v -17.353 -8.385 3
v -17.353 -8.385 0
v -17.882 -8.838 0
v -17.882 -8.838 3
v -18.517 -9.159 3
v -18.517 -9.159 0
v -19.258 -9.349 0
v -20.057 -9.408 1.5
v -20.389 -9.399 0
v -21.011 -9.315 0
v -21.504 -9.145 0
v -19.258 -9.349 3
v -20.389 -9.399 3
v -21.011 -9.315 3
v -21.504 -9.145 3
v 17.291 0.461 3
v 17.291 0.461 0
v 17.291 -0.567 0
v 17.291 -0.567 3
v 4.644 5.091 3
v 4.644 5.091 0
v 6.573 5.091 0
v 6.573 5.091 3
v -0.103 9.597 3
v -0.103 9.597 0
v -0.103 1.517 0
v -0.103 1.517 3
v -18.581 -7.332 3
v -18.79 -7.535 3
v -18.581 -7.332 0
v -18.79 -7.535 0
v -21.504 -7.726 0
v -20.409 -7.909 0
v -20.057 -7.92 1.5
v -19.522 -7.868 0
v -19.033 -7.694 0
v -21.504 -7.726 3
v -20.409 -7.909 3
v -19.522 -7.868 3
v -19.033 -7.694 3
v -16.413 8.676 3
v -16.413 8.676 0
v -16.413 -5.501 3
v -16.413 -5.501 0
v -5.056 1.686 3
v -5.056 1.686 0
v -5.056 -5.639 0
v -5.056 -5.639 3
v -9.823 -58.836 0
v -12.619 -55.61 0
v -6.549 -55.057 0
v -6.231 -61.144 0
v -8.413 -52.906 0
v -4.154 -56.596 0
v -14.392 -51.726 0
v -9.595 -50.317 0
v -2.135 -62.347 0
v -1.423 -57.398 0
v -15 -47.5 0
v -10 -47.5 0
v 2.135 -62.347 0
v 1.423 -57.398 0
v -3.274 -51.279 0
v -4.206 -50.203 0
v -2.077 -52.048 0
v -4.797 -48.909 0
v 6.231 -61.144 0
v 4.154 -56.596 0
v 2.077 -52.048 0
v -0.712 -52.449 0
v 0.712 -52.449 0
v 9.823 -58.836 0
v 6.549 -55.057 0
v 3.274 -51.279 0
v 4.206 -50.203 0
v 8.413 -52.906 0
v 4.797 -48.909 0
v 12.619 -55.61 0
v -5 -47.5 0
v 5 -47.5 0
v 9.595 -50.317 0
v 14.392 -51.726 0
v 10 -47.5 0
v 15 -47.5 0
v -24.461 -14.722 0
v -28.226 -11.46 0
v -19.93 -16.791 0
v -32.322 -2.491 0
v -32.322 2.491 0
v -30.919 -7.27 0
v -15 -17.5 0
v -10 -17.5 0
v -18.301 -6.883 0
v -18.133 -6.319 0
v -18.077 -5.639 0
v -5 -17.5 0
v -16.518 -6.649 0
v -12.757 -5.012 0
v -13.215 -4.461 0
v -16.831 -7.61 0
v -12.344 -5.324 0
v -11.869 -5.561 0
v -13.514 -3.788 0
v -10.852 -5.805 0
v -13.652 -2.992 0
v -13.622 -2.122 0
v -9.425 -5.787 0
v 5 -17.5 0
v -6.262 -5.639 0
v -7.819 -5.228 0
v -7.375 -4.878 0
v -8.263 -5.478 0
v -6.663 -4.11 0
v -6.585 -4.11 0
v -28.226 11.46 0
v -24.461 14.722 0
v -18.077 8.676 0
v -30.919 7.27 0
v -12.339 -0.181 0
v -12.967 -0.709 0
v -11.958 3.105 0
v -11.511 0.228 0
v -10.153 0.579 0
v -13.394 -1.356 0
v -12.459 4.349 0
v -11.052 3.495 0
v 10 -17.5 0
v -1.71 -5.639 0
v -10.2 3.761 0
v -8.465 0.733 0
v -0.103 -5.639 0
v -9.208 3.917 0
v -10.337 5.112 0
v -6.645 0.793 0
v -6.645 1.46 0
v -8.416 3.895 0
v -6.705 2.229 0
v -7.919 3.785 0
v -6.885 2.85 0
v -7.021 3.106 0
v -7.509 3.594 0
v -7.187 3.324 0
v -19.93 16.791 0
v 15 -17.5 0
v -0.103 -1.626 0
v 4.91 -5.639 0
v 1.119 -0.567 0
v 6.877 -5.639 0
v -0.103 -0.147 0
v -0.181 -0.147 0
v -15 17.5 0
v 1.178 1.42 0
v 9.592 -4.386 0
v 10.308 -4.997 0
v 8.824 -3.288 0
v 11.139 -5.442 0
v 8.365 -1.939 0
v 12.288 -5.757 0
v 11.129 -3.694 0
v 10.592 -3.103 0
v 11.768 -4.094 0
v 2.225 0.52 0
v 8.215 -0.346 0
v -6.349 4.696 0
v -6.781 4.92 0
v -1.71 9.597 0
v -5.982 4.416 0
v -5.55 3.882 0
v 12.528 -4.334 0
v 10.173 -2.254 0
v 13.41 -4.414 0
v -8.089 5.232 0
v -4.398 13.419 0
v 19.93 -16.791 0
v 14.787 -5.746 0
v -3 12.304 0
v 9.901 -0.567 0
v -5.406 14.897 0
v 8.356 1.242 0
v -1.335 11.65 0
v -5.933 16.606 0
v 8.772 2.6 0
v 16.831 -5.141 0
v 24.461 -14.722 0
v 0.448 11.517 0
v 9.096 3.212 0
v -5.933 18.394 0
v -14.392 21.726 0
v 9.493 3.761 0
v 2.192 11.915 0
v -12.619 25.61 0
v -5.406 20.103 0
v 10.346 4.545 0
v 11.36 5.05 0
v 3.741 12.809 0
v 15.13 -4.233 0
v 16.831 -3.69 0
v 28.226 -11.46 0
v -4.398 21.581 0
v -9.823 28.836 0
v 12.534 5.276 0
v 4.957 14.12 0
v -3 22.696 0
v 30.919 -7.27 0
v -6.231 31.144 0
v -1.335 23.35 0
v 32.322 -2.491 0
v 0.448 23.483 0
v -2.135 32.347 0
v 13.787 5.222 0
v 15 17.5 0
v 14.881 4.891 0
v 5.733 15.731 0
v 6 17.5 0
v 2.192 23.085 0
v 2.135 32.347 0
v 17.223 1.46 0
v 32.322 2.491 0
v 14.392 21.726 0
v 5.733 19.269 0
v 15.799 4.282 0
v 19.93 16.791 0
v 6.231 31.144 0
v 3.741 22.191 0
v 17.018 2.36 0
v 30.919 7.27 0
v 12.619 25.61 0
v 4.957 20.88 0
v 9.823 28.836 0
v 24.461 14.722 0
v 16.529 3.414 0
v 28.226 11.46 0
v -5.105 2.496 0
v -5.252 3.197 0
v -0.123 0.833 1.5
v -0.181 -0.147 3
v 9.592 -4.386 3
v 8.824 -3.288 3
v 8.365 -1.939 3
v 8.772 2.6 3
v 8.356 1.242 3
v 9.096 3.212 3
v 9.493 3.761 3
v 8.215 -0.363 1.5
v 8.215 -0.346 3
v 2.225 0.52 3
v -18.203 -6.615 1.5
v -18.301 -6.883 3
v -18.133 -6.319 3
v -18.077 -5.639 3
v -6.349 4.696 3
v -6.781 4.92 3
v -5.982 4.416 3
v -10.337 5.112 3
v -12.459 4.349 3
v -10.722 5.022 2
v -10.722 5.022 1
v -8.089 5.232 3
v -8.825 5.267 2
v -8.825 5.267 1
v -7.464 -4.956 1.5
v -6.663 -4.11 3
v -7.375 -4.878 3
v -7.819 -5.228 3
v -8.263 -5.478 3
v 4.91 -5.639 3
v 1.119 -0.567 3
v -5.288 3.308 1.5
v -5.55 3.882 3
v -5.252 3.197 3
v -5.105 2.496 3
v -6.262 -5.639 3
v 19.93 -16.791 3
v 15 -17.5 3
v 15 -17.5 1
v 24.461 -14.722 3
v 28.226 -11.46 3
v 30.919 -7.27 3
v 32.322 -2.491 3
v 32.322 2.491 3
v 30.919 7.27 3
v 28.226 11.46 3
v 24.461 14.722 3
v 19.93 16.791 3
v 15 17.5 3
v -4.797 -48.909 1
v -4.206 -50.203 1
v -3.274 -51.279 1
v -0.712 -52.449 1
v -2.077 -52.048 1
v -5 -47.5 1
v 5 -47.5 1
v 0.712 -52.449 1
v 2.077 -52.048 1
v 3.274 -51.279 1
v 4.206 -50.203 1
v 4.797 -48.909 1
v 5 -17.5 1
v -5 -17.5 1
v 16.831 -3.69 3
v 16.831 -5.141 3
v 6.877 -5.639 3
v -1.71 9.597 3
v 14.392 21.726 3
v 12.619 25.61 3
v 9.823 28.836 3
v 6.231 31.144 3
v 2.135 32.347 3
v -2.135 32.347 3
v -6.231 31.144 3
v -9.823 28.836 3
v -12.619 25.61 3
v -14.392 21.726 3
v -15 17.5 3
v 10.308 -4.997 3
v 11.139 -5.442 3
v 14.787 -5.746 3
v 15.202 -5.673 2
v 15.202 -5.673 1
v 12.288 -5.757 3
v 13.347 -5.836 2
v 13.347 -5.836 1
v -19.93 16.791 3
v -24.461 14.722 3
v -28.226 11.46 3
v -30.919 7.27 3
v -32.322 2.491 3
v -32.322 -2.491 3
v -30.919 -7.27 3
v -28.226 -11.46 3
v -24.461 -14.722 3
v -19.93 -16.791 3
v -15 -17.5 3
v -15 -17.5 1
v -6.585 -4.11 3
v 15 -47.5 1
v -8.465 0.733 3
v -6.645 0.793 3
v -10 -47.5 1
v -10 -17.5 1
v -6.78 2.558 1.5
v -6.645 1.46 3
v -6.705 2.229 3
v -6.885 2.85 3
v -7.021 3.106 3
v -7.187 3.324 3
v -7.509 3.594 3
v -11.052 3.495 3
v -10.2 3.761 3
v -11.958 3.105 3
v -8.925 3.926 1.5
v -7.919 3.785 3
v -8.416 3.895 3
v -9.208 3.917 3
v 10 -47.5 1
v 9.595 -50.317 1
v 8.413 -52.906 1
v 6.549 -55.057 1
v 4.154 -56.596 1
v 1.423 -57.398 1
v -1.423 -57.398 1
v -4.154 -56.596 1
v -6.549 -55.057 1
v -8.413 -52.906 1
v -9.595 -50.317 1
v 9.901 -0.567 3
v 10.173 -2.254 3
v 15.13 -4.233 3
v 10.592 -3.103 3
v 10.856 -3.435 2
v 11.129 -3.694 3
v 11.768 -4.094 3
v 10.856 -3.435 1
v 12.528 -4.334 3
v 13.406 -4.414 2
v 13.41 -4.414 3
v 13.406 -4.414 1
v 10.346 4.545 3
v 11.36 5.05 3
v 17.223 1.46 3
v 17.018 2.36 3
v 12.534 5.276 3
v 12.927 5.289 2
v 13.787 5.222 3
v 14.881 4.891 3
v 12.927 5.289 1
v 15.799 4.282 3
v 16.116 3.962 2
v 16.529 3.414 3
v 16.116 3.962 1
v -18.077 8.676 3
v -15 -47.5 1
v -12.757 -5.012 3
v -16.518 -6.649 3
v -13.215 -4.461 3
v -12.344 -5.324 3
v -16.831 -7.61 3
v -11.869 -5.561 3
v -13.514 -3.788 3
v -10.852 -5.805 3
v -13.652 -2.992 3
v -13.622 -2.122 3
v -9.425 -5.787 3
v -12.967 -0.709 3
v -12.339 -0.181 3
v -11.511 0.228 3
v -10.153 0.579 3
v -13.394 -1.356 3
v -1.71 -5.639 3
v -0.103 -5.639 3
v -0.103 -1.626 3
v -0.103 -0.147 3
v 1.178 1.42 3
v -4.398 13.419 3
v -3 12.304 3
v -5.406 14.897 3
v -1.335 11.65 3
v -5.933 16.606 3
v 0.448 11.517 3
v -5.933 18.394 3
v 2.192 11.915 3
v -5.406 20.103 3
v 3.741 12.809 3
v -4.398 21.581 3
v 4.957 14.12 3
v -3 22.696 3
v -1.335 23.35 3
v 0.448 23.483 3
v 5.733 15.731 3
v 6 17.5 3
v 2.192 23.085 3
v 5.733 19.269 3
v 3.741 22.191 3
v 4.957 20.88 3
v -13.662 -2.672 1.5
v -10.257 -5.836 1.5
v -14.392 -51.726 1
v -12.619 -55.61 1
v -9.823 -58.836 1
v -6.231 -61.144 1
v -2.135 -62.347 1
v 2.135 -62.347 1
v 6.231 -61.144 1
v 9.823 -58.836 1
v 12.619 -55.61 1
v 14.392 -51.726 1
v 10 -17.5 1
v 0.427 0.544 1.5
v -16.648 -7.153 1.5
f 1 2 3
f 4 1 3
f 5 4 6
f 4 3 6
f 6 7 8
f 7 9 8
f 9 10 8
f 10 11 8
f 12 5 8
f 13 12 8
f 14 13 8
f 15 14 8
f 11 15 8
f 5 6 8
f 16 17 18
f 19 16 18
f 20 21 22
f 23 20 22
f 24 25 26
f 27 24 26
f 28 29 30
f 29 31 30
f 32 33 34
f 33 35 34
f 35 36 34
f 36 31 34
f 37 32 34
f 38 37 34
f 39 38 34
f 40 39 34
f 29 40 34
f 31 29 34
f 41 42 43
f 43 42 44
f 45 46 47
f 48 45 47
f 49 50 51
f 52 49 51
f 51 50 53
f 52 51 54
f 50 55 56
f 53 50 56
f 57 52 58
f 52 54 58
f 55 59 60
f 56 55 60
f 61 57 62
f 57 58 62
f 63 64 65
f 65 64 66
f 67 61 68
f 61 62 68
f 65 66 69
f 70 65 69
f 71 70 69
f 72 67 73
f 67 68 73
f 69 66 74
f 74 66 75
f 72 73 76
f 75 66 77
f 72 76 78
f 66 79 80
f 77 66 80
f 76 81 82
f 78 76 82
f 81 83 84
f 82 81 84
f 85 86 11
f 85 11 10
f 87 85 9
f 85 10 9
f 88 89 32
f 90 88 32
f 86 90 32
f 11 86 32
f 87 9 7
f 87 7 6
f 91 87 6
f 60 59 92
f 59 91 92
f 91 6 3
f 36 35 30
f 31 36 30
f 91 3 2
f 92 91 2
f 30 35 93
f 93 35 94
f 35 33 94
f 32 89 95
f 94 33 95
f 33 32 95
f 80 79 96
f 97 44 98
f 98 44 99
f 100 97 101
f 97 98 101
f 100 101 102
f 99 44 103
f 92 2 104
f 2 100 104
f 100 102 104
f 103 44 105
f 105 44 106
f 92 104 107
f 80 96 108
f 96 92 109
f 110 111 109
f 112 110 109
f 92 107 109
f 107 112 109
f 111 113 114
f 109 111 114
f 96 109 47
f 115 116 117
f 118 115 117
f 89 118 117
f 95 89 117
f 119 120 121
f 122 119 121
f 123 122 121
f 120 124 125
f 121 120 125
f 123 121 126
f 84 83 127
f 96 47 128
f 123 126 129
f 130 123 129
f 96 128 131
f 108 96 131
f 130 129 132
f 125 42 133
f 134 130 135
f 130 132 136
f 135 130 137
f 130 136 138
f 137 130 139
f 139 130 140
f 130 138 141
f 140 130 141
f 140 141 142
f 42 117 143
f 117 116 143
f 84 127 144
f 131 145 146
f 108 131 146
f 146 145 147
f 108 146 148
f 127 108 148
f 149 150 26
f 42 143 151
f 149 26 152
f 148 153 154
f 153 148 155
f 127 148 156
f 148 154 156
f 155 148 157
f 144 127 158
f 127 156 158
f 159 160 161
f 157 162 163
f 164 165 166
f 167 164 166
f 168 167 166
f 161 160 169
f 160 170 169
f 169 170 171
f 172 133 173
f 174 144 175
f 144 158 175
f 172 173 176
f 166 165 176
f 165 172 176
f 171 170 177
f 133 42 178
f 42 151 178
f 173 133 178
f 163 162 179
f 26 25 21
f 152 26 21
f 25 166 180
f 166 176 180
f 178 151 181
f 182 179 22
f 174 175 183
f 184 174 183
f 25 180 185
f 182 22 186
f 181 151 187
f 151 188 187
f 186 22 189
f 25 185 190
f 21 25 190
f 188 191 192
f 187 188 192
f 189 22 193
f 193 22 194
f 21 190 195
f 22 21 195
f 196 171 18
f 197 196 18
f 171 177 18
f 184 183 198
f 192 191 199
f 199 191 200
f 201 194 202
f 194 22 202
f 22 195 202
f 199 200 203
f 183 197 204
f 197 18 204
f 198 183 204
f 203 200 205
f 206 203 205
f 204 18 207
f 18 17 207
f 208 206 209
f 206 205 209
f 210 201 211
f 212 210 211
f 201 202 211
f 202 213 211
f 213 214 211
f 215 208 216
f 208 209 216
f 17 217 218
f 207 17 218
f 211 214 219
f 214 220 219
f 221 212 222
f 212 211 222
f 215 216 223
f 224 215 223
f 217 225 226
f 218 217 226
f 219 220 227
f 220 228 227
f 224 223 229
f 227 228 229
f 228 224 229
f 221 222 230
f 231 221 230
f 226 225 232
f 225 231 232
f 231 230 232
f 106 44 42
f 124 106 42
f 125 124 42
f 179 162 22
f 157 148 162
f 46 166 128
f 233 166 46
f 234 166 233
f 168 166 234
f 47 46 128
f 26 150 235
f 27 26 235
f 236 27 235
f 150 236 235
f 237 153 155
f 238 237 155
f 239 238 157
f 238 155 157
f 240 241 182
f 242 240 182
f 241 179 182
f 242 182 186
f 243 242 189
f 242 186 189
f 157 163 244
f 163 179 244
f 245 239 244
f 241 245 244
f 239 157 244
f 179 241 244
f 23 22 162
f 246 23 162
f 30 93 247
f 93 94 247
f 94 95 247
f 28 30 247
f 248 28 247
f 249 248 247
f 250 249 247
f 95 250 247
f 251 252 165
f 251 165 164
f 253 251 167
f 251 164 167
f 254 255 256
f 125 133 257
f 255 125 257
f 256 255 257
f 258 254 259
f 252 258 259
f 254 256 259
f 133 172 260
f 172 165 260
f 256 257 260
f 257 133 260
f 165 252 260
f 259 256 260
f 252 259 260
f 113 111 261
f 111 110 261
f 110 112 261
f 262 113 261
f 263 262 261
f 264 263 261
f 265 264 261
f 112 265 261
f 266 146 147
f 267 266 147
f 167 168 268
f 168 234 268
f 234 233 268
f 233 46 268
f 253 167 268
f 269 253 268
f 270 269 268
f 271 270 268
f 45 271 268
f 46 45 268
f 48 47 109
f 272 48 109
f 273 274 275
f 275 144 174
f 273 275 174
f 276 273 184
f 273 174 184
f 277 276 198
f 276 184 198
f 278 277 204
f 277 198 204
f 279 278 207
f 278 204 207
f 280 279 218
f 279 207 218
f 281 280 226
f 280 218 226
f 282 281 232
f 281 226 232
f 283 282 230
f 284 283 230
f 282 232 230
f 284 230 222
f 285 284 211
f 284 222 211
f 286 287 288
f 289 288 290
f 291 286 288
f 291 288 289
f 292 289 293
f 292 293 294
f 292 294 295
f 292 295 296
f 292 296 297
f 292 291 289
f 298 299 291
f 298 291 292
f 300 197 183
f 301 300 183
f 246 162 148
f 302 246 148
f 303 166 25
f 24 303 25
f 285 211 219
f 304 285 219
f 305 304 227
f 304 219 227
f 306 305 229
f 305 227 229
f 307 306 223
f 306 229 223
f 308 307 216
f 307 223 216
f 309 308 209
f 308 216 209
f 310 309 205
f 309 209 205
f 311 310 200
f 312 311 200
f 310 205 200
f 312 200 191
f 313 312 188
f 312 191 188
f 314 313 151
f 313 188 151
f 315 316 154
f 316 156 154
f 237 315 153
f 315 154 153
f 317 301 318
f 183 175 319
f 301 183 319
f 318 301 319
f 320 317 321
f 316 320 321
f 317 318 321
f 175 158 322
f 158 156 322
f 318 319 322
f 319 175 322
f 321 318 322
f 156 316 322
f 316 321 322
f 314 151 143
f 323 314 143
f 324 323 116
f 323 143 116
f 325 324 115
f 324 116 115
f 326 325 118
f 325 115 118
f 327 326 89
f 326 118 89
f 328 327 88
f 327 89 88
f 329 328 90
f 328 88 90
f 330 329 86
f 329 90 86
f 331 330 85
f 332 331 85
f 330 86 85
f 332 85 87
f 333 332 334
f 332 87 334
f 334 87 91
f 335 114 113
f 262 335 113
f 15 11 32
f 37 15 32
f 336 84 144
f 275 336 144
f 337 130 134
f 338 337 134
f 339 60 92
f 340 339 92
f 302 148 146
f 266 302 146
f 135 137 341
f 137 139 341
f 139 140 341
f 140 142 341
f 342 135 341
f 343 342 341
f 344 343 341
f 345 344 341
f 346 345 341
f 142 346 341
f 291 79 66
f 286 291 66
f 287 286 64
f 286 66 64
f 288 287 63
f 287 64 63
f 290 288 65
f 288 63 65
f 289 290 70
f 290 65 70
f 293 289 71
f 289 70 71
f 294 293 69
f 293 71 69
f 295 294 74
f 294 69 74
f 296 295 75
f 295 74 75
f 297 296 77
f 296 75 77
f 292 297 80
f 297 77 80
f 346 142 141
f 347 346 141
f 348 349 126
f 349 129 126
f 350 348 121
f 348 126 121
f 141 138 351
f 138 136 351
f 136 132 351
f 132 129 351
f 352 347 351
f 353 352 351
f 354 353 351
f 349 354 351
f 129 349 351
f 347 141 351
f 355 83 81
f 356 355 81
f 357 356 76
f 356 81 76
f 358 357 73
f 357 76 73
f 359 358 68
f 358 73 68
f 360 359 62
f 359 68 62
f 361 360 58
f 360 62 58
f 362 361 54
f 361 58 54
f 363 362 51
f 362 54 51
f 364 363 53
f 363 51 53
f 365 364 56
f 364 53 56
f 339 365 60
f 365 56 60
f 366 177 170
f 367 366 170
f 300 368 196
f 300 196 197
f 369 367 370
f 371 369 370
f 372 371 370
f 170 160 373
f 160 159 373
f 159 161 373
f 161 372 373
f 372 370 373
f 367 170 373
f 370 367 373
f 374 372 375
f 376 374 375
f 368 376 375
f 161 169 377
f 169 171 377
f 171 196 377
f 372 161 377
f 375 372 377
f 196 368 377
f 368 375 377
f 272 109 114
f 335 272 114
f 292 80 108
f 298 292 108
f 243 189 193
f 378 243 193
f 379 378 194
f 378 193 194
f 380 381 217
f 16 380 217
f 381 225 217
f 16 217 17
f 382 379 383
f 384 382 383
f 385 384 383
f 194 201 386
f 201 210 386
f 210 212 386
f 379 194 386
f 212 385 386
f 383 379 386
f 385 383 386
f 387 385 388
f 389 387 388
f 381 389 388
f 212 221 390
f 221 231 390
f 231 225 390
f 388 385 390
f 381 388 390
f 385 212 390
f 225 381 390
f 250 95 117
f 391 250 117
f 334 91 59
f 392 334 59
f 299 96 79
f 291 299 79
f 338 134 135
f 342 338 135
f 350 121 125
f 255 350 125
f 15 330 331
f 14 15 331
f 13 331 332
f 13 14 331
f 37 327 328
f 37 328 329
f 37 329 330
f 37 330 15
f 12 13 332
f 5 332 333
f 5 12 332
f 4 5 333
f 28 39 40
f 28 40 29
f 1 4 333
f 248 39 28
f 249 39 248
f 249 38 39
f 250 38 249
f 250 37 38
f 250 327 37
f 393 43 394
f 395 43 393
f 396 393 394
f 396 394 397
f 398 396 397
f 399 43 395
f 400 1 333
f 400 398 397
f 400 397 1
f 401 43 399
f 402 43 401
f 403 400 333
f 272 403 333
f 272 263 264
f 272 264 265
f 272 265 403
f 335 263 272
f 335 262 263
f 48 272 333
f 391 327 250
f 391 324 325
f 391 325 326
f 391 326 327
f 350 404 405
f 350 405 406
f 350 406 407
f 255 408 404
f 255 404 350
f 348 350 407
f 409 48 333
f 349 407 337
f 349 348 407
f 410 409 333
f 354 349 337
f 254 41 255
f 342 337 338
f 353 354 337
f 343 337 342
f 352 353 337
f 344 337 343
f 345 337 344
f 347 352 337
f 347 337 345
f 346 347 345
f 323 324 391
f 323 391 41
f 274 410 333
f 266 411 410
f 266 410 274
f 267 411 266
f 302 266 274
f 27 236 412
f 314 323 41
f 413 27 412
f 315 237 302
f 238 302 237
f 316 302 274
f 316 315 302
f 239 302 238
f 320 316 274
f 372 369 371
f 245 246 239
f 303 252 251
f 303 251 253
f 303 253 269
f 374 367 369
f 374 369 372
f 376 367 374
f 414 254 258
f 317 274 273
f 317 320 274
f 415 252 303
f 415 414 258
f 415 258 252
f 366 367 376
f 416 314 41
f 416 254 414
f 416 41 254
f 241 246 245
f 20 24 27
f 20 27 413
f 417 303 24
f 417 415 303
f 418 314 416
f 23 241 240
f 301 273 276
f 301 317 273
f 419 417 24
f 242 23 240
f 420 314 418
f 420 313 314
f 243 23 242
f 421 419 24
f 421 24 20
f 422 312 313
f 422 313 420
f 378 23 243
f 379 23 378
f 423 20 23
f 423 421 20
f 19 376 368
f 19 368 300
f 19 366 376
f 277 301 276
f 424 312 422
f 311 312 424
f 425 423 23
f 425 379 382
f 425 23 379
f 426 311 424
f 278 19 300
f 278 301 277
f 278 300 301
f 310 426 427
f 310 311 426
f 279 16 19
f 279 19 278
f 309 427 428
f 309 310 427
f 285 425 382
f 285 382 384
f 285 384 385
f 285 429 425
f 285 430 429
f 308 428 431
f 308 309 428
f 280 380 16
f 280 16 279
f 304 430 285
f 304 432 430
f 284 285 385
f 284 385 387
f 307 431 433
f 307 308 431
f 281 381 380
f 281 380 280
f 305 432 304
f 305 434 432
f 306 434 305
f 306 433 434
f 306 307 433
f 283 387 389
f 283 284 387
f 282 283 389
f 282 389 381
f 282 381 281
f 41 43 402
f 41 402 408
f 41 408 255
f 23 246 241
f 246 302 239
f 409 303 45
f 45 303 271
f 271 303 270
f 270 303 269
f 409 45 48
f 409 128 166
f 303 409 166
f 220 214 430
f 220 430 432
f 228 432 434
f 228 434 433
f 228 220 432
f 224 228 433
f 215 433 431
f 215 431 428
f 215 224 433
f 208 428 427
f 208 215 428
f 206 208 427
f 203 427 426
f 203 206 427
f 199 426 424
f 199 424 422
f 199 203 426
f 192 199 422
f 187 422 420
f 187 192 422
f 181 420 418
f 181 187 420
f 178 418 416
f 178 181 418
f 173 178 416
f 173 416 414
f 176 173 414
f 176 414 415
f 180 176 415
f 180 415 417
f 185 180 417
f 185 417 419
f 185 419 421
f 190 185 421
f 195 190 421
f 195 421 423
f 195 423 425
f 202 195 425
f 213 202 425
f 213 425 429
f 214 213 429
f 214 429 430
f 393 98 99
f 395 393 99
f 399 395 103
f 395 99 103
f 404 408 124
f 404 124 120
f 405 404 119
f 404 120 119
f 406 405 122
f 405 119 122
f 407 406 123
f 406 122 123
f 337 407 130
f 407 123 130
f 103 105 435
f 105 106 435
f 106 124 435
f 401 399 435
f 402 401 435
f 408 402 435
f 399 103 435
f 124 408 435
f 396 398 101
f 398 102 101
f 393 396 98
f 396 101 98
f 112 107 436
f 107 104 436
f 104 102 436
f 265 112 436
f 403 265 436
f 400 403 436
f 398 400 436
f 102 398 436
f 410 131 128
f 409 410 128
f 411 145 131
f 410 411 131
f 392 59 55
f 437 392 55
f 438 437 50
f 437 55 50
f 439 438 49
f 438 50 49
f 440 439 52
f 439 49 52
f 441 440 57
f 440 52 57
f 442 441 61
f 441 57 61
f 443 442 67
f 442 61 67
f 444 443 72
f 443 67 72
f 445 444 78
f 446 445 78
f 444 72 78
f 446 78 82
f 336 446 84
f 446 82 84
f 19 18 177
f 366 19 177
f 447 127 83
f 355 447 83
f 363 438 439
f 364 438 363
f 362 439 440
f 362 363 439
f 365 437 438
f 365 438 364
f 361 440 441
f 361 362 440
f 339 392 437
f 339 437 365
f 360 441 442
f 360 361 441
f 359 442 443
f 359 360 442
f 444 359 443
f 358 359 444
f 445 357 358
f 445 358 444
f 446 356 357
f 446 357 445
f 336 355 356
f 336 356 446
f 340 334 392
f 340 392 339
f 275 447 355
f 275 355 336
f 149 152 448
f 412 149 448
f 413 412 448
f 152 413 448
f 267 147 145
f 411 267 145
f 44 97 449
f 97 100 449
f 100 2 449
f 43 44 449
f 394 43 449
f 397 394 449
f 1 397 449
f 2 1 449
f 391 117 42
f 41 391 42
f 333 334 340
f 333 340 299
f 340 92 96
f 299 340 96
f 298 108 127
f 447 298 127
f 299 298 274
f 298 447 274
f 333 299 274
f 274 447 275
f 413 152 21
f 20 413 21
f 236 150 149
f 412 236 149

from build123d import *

# Parameters (mm, degrees)
F0_R     = 6
F1_DEPTH = 3
F2_DEPTH = 1


with BuildPart() as f1:
    # F0 (on Top) → F1 (new body)
    with BuildSketch(Plane.XY):
        with BuildLine():
            Line((10, -17.5), (15, -17.5))
            ThreePointArc((15, -17.5), (32.5, 0), (15, 17.5))
            ThreePointArc((15, 17.5), (0, 32.5), (-15, 17.5))
            ThreePointArc((-15, 17.5), (-32.5, 0), (-15, -17.5))
            Line((-15, -17.5), (-10, -17.5))
            Line((-10, -17.5), (-5, -17.5))
            Line((-5, -17.5), (5, -17.5))
            Line((5, -17.5), (10, -17.5))
        make_face()
        with BuildLine():
            add(Edge.make_bspline(
                [(-17.3530564989, -8.385057961), (-18.2929470593, -9.4079721875), (-20.0568083443, -9.4079721875)],
                knots=[0, 0, 0, 1, 1, 1], degree=2))
            add(Edge.make_bspline(
                [(-20.0568083443, -9.4079721875), (-20.974768125, -9.4079721875), (-21.5042398074, -9.1448028306)],
                knots=[0, 0, 0, 1, 1, 1], degree=2))
            Line((-21.5042398074, -9.1448028306), (-21.5042398074, -7.7255680844))
            add(Edge.make_bspline(
                [(-21.5042398074, -7.7255680844), (-20.8087207927, -7.9198121336), (-20.0568083443, -7.9198121336)],
                knots=[0, 0, 0, 1, 1, 1], degree=2))
            add(Edge.make_bspline(
                [(-20.0568083443, -7.9198121336), (-19.0855880986, -7.9198121336), (-18.5811801645, -7.3323805333)],
                knots=[0, 0, 0, 1, 1, 1], degree=2))
            add(Edge.make_bspline(
                [(-18.5811801645, -7.3323805333), (-18.0767722304, -6.7449489331), (-18.0767722304, -5.6390110403)],
                knots=[0, 0, 0, 1, 1, 1], degree=2))
            Line((-18.0767722304, -5.6390110403), (-18.0767722304, 8.6755221946))
            Line((-18.0767722304, 8.6755221946), (-16.4131659385, 8.6755221946))
            Line((-16.4131659385, 8.6755221946), (-16.4131659385, -5.5011604248))
            add(Edge.make_bspline(
                [(-16.4131659385, -5.5011604248), (-16.4131659385, -7.3621437344), (-17.3530564989, -8.385057961)],
                knots=[0, 0, 0, 1, 1, 1], degree=2))
        make_face(mode=Mode.SUBTRACT)
        with BuildLine():
            Line((-5.0561550003, -5.6390110403), (-6.2623478861, -5.6390110403))
            Line((-6.2623478861, -5.6390110403), (-6.5850436452, -4.1101223954))
            Line((-6.5850436452, -4.1101223954), (-6.6633678586, -4.1101223954))
            add(Edge.make_bspline(
                [(-6.6633678586, -4.1101223954), (-7.4654078035, -5.1189382636), (-8.2627482955, -5.4776631608)],
                knots=[0, 0, 0, 1, 1, 1], degree=2))
            add(Edge.make_bspline(
                [(-8.2627482955, -5.4776631608), (-9.0600887876, -5.836388058), (-10.2568827679, -5.836388058)],
                knots=[0, 0, 0, 1, 1, 1], degree=2))
            add(Edge.make_bspline(
                [(-10.2568827679, -5.836388058), (-11.851563752, -5.836388058), (-12.7569916585, -5.0124173334)],
                knots=[0, 0, 0, 1, 1, 1], degree=2))
            add(Edge.make_bspline(
                [(-12.7569916585, -5.0124173334), (-13.6624195651, -4.1884466088), (-13.6624195651, -2.672089838)],
                knots=[0, 0, 0, 1, 1, 1], degree=2))
            add(Edge.make_bspline(
                [(-13.6624195651, -2.672089838), (-13.6624195651, 0.5767985325), (-8.464824766, 0.7334469592)],
                knots=[0, 0, 0, 1, 1, 1], degree=2))
            Line((-8.464824766, 0.7334469592), (-6.6445700474, 0.7929733614))
            Line((-6.6445700474, 0.7929733614), (-6.6445700474, 1.4602956592))
            add(Edge.make_bspline(
                [(-6.6445700474, 1.4602956592), (-6.6445700474, 2.7228819787), (-7.1865736039, 3.3244119374)],
                knots=[0, 0, 0, 1, 1, 1], degree=2))
            add(Edge.make_bspline(
                [(-7.1865736039, 3.3244119374), (-7.7285771604, 3.925941896), (-8.9253711406, 3.925941896)],
                knots=[0, 0, 0, 1, 1, 1], degree=2))
            add(Edge.make_bspline(
                [(-8.9253711406, 3.925941896), (-10.2662816735, 3.925941896), (-11.9580846822, 3.10510414)],
                knots=[0, 0, 0, 1, 1, 1], degree=2))
            Line((-11.9580846822, 3.10510414), (-12.4593596477, 4.3488926482))
            add(Edge.make_bspline(
                [(-12.4593596477, 4.3488926482), (-11.6667186085, 4.7781093375), (-10.7221285953, 5.0224808832)],
                knots=[0, 0, 0, 1, 1, 1], degree=2))
            add(Edge.make_bspline(
                [(-10.7221285953, 5.0224808832), (-9.7775385821, 5.2668524289), (-8.8251161475, 5.2668524289)],
                knots=[0, 0, 0, 1, 1, 1], degree=2))
            add(Edge.make_bspline(
                [(-8.8251161475, 5.2668524289), (-6.9077394043, 5.2668524289), (-5.9819472023, 4.4162514717)],
                knots=[0, 0, 0, 1, 1, 1], degree=2))
            add(Edge.make_bspline(
                [(-5.9819472023, 4.4162514717), (-5.0561550003, 3.5656505146), (-5.0561550003, 1.6858693937)],
                knots=[0, 0, 0, 1, 1, 1], degree=2))
            Line((-5.0561550003, 1.6858693937), (-5.0561550003, -5.6390110403))
        make_face(mode=Mode.SUBTRACT)
        with BuildLine():
            Line((-0.1812559603, -0.146917199), (-0.102931747, -0.146917199))
            add(Edge.make_bspline(
                [(-0.102931747, -0.146917199), (0.3168860367, 0.4514797911), (1.1784523837, 1.4195670683)],
                knots=[0, 0, 0, 1, 1, 1], degree=2))
            Line((1.1784523837, 1.4195670683), (4.6435155831, 5.0914061909))
            Line((4.6435155831, 5.0914061909), (6.5734242004, 5.0914061909))
            Line((6.5734242004, 5.0914061909), (2.2248638743, 0.5204050988))
            Line((2.2248638743, 0.5204050988), (6.8773221483, -5.6390110403))
            Line((6.8773221483, -5.6390110403), (4.9098179085, -5.6390110403))
            Line((4.9098179085, -5.6390110403), (1.1189259815, -0.5667349827))
            Line((1.1189259815, -0.5667349827), (-0.102931747, -1.6256783474))
            Line((-0.102931747, -1.6256783474), (-0.102931747, -5.6390110403))
            Line((-0.102931747, -5.6390110403), (-1.7101446053, -5.6390110403))
            Line((-1.7101446053, -5.6390110403), (-1.7101446053, 9.5966149438))
            Line((-1.7101446053, 9.5966149438), (-0.102931747, 9.5966149438))
            Line((-0.102931747, 9.5966149438), (-0.102931747, 1.5166890929))
            add(Edge.make_bspline(
                [(-0.102931747, 1.5166890929), (-0.102931747, 0.9809514734), (-0.1812559603, -0.146917199)],
                knots=[0, 0, 0, 1, 1, 1], degree=2))
        make_face(mode=Mode.SUBTRACT)
        with BuildLine():
            add(Edge.make_bspline(
                [(15.2016195449, -5.6734736942), (14.4340422539, -5.836388058), (13.3469021724, -5.836388058)],
                knots=[0, 0, 0, 1, 1, 1], degree=2))
            add(Edge.make_bspline(
                [(13.3469021724, -5.836388058), (10.9689790546, -5.836388058), (9.5920393836, -4.3858236265)],
                knots=[0, 0, 0, 1, 1, 1], degree=2))
            add(Edge.make_bspline(
                [(9.5920393836, -4.3858236265), (8.2150997126, -2.9352591949), (8.2150997126, -0.3630920279)],
                knots=[0, 0, 0, 1, 1, 1], degree=2))
            add(Edge.make_bspline(
                [(8.2150997126, -0.3630920279), (8.2150997126, 2.2341388873), (9.4933508747, 3.761461048)],
                knots=[0, 0, 0, 1, 1, 1], degree=2))
            add(Edge.make_bspline(
                [(9.4933508747, 3.761461048), (10.7716020369, 5.2887832086), (12.9270843887, 5.2887832086)],
                knots=[0, 0, 0, 1, 1, 1], degree=2))
            add(Edge.make_bspline(
                [(12.9270843887, 5.2887832086), (14.9415831565, 5.2887832086), (16.116446357, 3.9619710342)],
                knots=[0, 0, 0, 1, 1, 1], degree=2))
            add(Edge.make_bspline(
                [(16.116446357, 3.9619710342), (17.2913095575, 2.6351588598), (17.2913095575, 0.4608786967)],
                knots=[0, 0, 0, 1, 1, 1], degree=2))
            Line((17.2913095575, 0.4608786967), (17.2913095575, -0.5667349827))
            Line((17.2913095575, -0.5667349827), (9.9006367842, -0.5667349827))
            add(Edge.make_bspline(
                [(9.9006367842, -0.5667349827), (9.9507642808, -2.4559150091), (10.8561921873, -3.4349676762)],
                knots=[0, 0, 0, 1, 1, 1], degree=2))
            add(Edge.make_bspline(
                [(10.8561921873, -3.4349676762), (11.7616200938, -4.4140203433), (13.4064285746, -4.4140203433)],
                knots=[0, 0, 0, 1, 1, 1], degree=2))
            add(Edge.make_bspline(
                [(13.4064285746, -4.4140203433), (15.1389601742, -4.4140203433), (16.830763183, -3.6903046118)],
                knots=[0, 0, 0, 1, 1, 1], degree=2))
            Line((16.830763183, -3.6903046118), (16.830763183, -5.1408690433))
            add(Edge.make_bspline(
                [(16.830763183, -5.1408690433), (15.9691968359, -5.5105593304), (15.2016195449, -5.6734736942)],
                knots=[0, 0, 0, 1, 1, 1], degree=2))
        make_face(mode=Mode.SUBTRACT)
        with Locations((0, 17.5)):
            Circle(F0_R, mode=Mode.SUBTRACT)
    extrude(amount=F1_DEPTH)

    # F0 (on Top) → F2 (join)
    with BuildSketch(Plane.XY):
        with BuildLine():
            Line((15, -47.5), (15, -17.5))
            Line((15, -17.5), (10, -17.5))
            Line((10, -17.5), (10, -47.5))
            ThreePointArc((10, -47.5), (0, -57.5), (-10, -47.5))
            Line((-10, -47.5), (-10, -17.5))
            Line((-10, -17.5), (-15, -17.5))
            Line((-15, -17.5), (-15, -47.5))
            ThreePointArc((-15, -47.5), (0, -62.5), (15, -47.5))
        make_face()
        with BuildLine():
            Line((10, -17.5), (15, -17.5))
            ThreePointArc((15, -17.5), (32.5, 0), (15, 17.5))
            ThreePointArc((15, 17.5), (0, 32.5), (-15, 17.5))
            ThreePointArc((-15, 17.5), (-32.5, 0), (-15, -17.5))
            Line((-15, -17.5), (-10, -17.5))
            Line((-10, -17.5), (-5, -17.5))
            Line((-5, -17.5), (5, -17.5))
            Line((5, -17.5), (10, -17.5))
        make_face()
        with BuildLine():
            add(Edge.make_bspline(
                [(-17.3530564989, -8.385057961), (-18.2929470593, -9.4079721875), (-20.0568083443, -9.4079721875)],
                knots=[0, 0, 0, 1, 1, 1], degree=2))
            add(Edge.make_bspline(
                [(-20.0568083443, -9.4079721875), (-20.974768125, -9.4079721875), (-21.5042398074, -9.1448028306)],
                knots=[0, 0, 0, 1, 1, 1], degree=2))
            Line((-21.5042398074, -9.1448028306), (-21.5042398074, -7.7255680844))
            add(Edge.make_bspline(
                [(-21.5042398074, -7.7255680844), (-20.8087207927, -7.9198121336), (-20.0568083443, -7.9198121336)],
                knots=[0, 0, 0, 1, 1, 1], degree=2))
            add(Edge.make_bspline(
                [(-20.0568083443, -7.9198121336), (-19.0855880986, -7.9198121336), (-18.5811801645, -7.3323805333)],
                knots=[0, 0, 0, 1, 1, 1], degree=2))
            add(Edge.make_bspline(
                [(-18.5811801645, -7.3323805333), (-18.0767722304, -6.7449489331), (-18.0767722304, -5.6390110403)],
                knots=[0, 0, 0, 1, 1, 1], degree=2))
            Line((-18.0767722304, -5.6390110403), (-18.0767722304, 8.6755221946))
            Line((-18.0767722304, 8.6755221946), (-16.4131659385, 8.6755221946))
            Line((-16.4131659385, 8.6755221946), (-16.4131659385, -5.5011604248))
            add(Edge.make_bspline(
                [(-16.4131659385, -5.5011604248), (-16.4131659385, -7.3621437344), (-17.3530564989, -8.385057961)],
                knots=[0, 0, 0, 1, 1, 1], degree=2))
        make_face(mode=Mode.SUBTRACT)
        with BuildLine():
            Line((-5.0561550003, -5.6390110403), (-6.2623478861, -5.6390110403))
            Line((-6.2623478861, -5.6390110403), (-6.5850436452, -4.1101223954))
            Line((-6.5850436452, -4.1101223954), (-6.6633678586, -4.1101223954))
            add(Edge.make_bspline(
                [(-6.6633678586, -4.1101223954), (-7.4654078035, -5.1189382636), (-8.2627482955, -5.4776631608)],
                knots=[0, 0, 0, 1, 1, 1], degree=2))
            add(Edge.make_bspline(
                [(-8.2627482955, -5.4776631608), (-9.0600887876, -5.836388058), (-10.2568827679, -5.836388058)],
                knots=[0, 0, 0, 1, 1, 1], degree=2))
            add(Edge.make_bspline(
                [(-10.2568827679, -5.836388058), (-11.851563752, -5.836388058), (-12.7569916585, -5.0124173334)],
                knots=[0, 0, 0, 1, 1, 1], degree=2))
            add(Edge.make_bspline(
                [(-12.7569916585, -5.0124173334), (-13.6624195651, -4.1884466088), (-13.6624195651, -2.672089838)],
                knots=[0, 0, 0, 1, 1, 1], degree=2))
            add(Edge.make_bspline(
                [(-13.6624195651, -2.672089838), (-13.6624195651, 0.5767985325), (-8.464824766, 0.7334469592)],
                knots=[0, 0, 0, 1, 1, 1], degree=2))
            Line((-8.464824766, 0.7334469592), (-6.6445700474, 0.7929733614))
            Line((-6.6445700474, 0.7929733614), (-6.6445700474, 1.4602956592))
            add(Edge.make_bspline(
                [(-6.6445700474, 1.4602956592), (-6.6445700474, 2.7228819787), (-7.1865736039, 3.3244119374)],
                knots=[0, 0, 0, 1, 1, 1], degree=2))
            add(Edge.make_bspline(
                [(-7.1865736039, 3.3244119374), (-7.7285771604, 3.925941896), (-8.9253711406, 3.925941896)],
                knots=[0, 0, 0, 1, 1, 1], degree=2))
            add(Edge.make_bspline(
                [(-8.9253711406, 3.925941896), (-10.2662816735, 3.925941896), (-11.9580846822, 3.10510414)],
                knots=[0, 0, 0, 1, 1, 1], degree=2))
            Line((-11.9580846822, 3.10510414), (-12.4593596477, 4.3488926482))
            add(Edge.make_bspline(
                [(-12.4593596477, 4.3488926482), (-11.6667186085, 4.7781093375), (-10.7221285953, 5.0224808832)],
                knots=[0, 0, 0, 1, 1, 1], degree=2))
            add(Edge.make_bspline(
                [(-10.7221285953, 5.0224808832), (-9.7775385821, 5.2668524289), (-8.8251161475, 5.2668524289)],
                knots=[0, 0, 0, 1, 1, 1], degree=2))
            add(Edge.make_bspline(
                [(-8.8251161475, 5.2668524289), (-6.9077394043, 5.2668524289), (-5.9819472023, 4.4162514717)],
                knots=[0, 0, 0, 1, 1, 1], degree=2))
            add(Edge.make_bspline(
                [(-5.9819472023, 4.4162514717), (-5.0561550003, 3.5656505146), (-5.0561550003, 1.6858693937)],
                knots=[0, 0, 0, 1, 1, 1], degree=2))
            Line((-5.0561550003, 1.6858693937), (-5.0561550003, -5.6390110403))
        make_face(mode=Mode.SUBTRACT)
        with BuildLine():
            Line((-0.1812559603, -0.146917199), (-0.102931747, -0.146917199))
            add(Edge.make_bspline(
                [(-0.102931747, -0.146917199), (0.3168860367, 0.4514797911), (1.1784523837, 1.4195670683)],
                knots=[0, 0, 0, 1, 1, 1], degree=2))
            Line((1.1784523837, 1.4195670683), (4.6435155831, 5.0914061909))
            Line((4.6435155831, 5.0914061909), (6.5734242004, 5.0914061909))
            Line((6.5734242004, 5.0914061909), (2.2248638743, 0.5204050988))
            Line((2.2248638743, 0.5204050988), (6.8773221483, -5.6390110403))
            Line((6.8773221483, -5.6390110403), (4.9098179085, -5.6390110403))
            Line((4.9098179085, -5.6390110403), (1.1189259815, -0.5667349827))
            Line((1.1189259815, -0.5667349827), (-0.102931747, -1.6256783474))
            Line((-0.102931747, -1.6256783474), (-0.102931747, -5.6390110403))
            Line((-0.102931747, -5.6390110403), (-1.7101446053, -5.6390110403))
            Line((-1.7101446053, -5.6390110403), (-1.7101446053, 9.5966149438))
            Line((-1.7101446053, 9.5966149438), (-0.102931747, 9.5966149438))
            Line((-0.102931747, 9.5966149438), (-0.102931747, 1.5166890929))
            add(Edge.make_bspline(
                [(-0.102931747, 1.5166890929), (-0.102931747, 0.9809514734), (-0.1812559603, -0.146917199)],
                knots=[0, 0, 0, 1, 1, 1], degree=2))
        make_face(mode=Mode.SUBTRACT)
        with BuildLine():
            add(Edge.make_bspline(
                [(15.2016195449, -5.6734736942), (14.4340422539, -5.836388058), (13.3469021724, -5.836388058)],
                knots=[0, 0, 0, 1, 1, 1], degree=2))
            add(Edge.make_bspline(
                [(13.3469021724, -5.836388058), (10.9689790546, -5.836388058), (9.5920393836, -4.3858236265)],
                knots=[0, 0, 0, 1, 1, 1], degree=2))
            add(Edge.make_bspline(
                [(9.5920393836, -4.3858236265), (8.2150997126, -2.9352591949), (8.2150997126, -0.3630920279)],
                knots=[0, 0, 0, 1, 1, 1], degree=2))
            add(Edge.make_bspline(
                [(8.2150997126, -0.3630920279), (8.2150997126, 2.2341388873), (9.4933508747, 3.761461048)],
                knots=[0, 0, 0, 1, 1, 1], degree=2))
            add(Edge.make_bspline(
                [(9.4933508747, 3.761461048), (10.7716020369, 5.2887832086), (12.9270843887, 5.2887832086)],
                knots=[0, 0, 0, 1, 1, 1], degree=2))
            add(Edge.make_bspline(
                [(12.9270843887, 5.2887832086), (14.9415831565, 5.2887832086), (16.116446357, 3.9619710342)],
                knots=[0, 0, 0, 1, 1, 1], degree=2))
            add(Edge.make_bspline(
                [(16.116446357, 3.9619710342), (17.2913095575, 2.6351588598), (17.2913095575, 0.4608786967)],
                knots=[0, 0, 0, 1, 1, 1], degree=2))
            Line((17.2913095575, 0.4608786967), (17.2913095575, -0.5667349827))
            Line((17.2913095575, -0.5667349827), (9.9006367842, -0.5667349827))
            add(Edge.make_bspline(
                [(9.9006367842, -0.5667349827), (9.9507642808, -2.4559150091), (10.8561921873, -3.4349676762)],
                knots=[0, 0, 0, 1, 1, 1], degree=2))
            add(Edge.make_bspline(
                [(10.8561921873, -3.4349676762), (11.7616200938, -4.4140203433), (13.4064285746, -4.4140203433)],
                knots=[0, 0, 0, 1, 1, 1], degree=2))
            add(Edge.make_bspline(
                [(13.4064285746, -4.4140203433), (15.1389601742, -4.4140203433), (16.830763183, -3.6903046118)],
                knots=[0, 0, 0, 1, 1, 1], degree=2))
            Line((16.830763183, -3.6903046118), (16.830763183, -5.1408690433))
            add(Edge.make_bspline(
                [(16.830763183, -5.1408690433), (15.9691968359, -5.5105593304), (15.2016195449, -5.6734736942)],
                knots=[0, 0, 0, 1, 1, 1], degree=2))
        make_face(mode=Mode.SUBTRACT)
        with Locations((0, 17.5)):
            Circle(F0_R, mode=Mode.SUBTRACT)
        with BuildLine():
            Line((5, -47.5), (5, -17.5))
            Line((5, -17.5), (-5, -17.5))
            Line((-5, -17.5), (-5, -47.5))
            ThreePointArc((-5, -47.5), (0, -52.5), (5, -47.5))
        make_face()
    extrude(amount=F2_DEPTH)


solid = f1.part
